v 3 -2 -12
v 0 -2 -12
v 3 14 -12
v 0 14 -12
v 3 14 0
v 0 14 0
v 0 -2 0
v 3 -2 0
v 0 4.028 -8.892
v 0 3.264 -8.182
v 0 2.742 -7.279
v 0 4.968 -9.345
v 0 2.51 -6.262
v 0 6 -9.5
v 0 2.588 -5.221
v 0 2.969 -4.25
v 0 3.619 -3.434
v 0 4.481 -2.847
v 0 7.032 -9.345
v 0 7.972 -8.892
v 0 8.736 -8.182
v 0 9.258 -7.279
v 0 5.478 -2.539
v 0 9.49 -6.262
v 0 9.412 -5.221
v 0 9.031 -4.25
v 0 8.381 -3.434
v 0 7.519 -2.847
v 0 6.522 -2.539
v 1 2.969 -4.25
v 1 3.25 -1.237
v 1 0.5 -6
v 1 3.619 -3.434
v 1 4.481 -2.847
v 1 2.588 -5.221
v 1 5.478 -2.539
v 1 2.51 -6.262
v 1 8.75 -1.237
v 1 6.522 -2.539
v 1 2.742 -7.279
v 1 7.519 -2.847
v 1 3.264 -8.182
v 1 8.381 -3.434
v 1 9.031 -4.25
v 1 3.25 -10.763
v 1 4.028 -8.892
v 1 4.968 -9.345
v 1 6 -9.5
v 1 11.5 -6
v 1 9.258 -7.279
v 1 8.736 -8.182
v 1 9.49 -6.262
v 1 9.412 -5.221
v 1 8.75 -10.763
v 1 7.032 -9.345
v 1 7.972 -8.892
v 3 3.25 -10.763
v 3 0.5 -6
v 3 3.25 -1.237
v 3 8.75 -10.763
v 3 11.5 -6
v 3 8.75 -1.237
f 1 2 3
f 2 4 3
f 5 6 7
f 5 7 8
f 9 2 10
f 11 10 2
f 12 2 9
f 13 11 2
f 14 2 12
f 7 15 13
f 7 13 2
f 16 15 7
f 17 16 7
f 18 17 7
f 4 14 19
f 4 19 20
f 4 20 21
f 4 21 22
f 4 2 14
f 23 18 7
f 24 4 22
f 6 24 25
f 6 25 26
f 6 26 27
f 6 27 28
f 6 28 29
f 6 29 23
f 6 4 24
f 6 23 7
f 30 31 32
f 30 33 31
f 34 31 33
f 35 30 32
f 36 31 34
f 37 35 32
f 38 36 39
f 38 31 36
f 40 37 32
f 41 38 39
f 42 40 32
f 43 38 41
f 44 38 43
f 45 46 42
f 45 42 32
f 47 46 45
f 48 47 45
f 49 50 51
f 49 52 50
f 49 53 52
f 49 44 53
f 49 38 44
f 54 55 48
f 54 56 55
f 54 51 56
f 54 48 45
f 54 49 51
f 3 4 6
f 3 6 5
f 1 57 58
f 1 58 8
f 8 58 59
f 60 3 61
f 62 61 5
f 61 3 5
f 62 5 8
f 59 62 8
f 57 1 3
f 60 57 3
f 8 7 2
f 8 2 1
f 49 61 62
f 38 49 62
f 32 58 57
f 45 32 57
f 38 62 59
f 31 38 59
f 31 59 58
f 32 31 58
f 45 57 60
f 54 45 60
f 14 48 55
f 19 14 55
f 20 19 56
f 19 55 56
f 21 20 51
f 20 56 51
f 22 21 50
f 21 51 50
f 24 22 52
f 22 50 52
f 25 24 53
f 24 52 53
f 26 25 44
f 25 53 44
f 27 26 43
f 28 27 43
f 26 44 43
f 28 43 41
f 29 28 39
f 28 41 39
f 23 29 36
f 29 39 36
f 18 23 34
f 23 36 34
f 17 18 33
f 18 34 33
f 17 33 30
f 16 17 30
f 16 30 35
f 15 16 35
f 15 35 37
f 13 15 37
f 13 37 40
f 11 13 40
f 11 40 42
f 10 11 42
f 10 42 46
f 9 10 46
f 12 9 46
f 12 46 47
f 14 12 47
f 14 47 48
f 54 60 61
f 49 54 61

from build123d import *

# Parameters (mm, degrees)
SKETCH1_W           = 12
SKETCH1_H           = 12
BOSS_EXTRUDE1_DEPTH = 3
SKETCH2_R           = 3.5
CUT_EXTRUDE1_DEPTH  = 3
CUT_EXTRUDE2_DEPTH  = 2
SKETCH4_W           = 3
SKETCH4_H           = 12
BOSS_EXTRUDE2_DEPTH = 2
SKETCH5_W           = 3
SKETCH5_H           = 12
BOSS_EXTRUDE3_DEPTH = 2


with BuildPart() as part:
    # Sketch1 → Boss-Extrude1 (new body)
    with BuildSketch(Plane(origin=(0, 0, 0), x_dir=(0, 0, -1), z_dir=(1, 0, 0))):
        with Locations((6, 6)):
            Rectangle(SKETCH1_W, SKETCH1_H)
    extrude(amount=BOSS_EXTRUDE1_DEPTH)

    # Sketch2 → Cut-Extrude1 (cut)
    with BuildSketch(Plane(origin=(3, 0, 0), x_dir=(0, 0, -1), z_dir=(1, 0, 0))):
        with Locations((6, 6)):
            Circle(SKETCH2_R)
    extrude(amount=-CUT_EXTRUDE1_DEPTH, mode=Mode.SUBTRACT)

    # Sketch3 → Cut-Extrude2 (cut)
    with BuildSketch(Plane(origin=(3, 0, 0), x_dir=(0, 0, -1), z_dir=(1, 0, 0))):
        Polygon((6, 11.5), (1.236860279, 8.75), (1.236860279, 3.25), (6, 0.5), (10.763139721, 3.25), (10.763139721, 8.75), align=None)
    extrude(amount=-CUT_EXTRUDE2_DEPTH, mode=Mode.SUBTRACT)

    # Sketch4 → Boss-Extrude2 (add)
    with BuildSketch(Plane(origin=(0, 12, 0), x_dir=(1, 0, 0), z_dir=(0, 1, 0))):
        with Locations((1.5, 6)):
            Rectangle(SKETCH4_W, SKETCH4_H)
    extrude(amount=BOSS_EXTRUDE2_DEPTH)

    # Sketch5 → Boss-Extrude3 (add)
    with BuildSketch(Plane.XZ):
        with Locations((1.5, -6)):
            Rectangle(SKETCH5_W, SKETCH5_H)
    extrude(amount=BOSS_EXTRUDE3_DEPTH)


solid = part.part
